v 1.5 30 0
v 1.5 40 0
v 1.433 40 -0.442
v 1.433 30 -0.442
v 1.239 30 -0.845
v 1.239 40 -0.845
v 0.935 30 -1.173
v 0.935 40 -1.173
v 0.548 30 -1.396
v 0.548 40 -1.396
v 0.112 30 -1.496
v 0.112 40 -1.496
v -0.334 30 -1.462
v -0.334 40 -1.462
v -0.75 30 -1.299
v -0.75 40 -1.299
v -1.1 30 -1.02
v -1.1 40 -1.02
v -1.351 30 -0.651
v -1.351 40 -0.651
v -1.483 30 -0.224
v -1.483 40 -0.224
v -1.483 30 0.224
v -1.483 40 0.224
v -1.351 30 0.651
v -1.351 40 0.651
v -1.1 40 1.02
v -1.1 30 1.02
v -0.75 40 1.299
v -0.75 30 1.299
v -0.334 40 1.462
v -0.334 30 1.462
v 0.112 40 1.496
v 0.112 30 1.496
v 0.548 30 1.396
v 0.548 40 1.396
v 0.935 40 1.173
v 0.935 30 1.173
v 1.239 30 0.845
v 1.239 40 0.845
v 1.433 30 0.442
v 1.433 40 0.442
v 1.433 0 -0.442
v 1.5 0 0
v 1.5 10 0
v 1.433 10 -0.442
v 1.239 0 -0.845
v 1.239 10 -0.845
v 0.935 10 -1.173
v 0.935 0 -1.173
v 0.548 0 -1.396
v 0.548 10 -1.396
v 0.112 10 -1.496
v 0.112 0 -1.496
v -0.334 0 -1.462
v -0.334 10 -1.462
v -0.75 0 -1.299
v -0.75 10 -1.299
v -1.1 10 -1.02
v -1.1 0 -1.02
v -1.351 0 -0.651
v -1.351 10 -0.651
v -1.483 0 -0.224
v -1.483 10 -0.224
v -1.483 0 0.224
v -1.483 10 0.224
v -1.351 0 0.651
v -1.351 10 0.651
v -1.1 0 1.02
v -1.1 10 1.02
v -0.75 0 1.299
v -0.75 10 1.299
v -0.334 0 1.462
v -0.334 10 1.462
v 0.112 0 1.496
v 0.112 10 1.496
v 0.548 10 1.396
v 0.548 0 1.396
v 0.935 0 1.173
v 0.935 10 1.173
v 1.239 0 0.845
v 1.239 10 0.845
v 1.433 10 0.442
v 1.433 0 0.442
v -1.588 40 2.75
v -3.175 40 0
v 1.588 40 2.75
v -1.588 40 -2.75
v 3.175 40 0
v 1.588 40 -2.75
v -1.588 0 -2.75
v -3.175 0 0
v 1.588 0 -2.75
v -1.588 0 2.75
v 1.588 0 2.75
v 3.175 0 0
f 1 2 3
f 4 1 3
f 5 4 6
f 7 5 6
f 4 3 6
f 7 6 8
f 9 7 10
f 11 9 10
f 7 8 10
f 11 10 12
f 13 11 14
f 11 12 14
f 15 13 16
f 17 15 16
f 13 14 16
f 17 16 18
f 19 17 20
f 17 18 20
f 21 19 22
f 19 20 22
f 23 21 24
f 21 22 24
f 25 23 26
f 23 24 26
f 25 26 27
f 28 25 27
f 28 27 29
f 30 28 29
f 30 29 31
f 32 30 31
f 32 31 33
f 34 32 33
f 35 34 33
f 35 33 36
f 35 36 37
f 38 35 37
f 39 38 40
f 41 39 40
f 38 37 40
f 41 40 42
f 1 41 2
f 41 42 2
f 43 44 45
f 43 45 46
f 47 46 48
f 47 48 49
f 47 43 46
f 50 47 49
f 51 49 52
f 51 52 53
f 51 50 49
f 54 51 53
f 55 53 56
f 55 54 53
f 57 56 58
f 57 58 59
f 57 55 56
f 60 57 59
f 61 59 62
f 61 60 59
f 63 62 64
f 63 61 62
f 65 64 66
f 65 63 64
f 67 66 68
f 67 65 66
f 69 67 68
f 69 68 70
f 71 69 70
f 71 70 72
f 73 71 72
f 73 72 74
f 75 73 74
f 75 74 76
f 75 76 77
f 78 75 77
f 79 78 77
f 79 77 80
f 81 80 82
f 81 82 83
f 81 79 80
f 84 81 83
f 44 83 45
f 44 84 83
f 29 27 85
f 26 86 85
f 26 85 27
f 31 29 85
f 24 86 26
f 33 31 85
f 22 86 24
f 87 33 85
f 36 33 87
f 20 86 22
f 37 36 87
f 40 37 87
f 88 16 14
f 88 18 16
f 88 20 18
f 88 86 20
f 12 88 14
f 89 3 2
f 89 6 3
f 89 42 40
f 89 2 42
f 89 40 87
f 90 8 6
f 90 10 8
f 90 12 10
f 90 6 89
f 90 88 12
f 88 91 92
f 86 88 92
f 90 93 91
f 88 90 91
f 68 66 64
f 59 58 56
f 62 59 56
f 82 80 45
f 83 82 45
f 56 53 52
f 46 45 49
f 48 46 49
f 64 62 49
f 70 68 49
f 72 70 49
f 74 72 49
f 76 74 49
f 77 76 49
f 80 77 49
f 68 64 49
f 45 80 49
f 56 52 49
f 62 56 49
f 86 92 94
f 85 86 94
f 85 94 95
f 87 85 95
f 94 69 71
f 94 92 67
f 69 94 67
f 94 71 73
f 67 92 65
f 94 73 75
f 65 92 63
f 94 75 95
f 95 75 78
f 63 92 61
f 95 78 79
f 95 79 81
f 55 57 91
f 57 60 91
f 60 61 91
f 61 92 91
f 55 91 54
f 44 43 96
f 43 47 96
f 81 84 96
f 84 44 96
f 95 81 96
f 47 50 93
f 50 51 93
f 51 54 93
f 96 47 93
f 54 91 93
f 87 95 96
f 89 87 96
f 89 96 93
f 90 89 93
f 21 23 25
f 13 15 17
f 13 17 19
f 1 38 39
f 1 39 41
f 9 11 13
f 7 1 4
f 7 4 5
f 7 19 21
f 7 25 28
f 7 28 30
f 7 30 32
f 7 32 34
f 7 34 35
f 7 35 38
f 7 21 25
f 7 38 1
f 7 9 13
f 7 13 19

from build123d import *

# Parameters (mm, degrees)
BOSS_EXTRUDE1_DEPTH = 40
SKETCH2_R           = 1.5
CUT_EXTRUDE1_DEPTH  = 10


with BuildPart() as part:
    # Sketch1 → Boss-Extrude1 (new body)
    with BuildSketch(Plane(origin=(0, 0, 0), x_dir=(1, 0, 0), z_dir=(0, 1, 0))):
        Polygon((3.175426481, 0), (1.58771324, 2.75), (-1.58771324, 2.75), (-3.175426481, 0), (-1.58771324, -2.75), (1.58771324, -2.75), align=None)
    extrude(amount=BOSS_EXTRUDE1_DEPTH)

    # Sketch2 → Cut-Extrude1 (cut)
    with BuildSketch(Plane(origin=(0, 40, 0), x_dir=(1, 0, 0), z_dir=(0, 1, 0))):
        Circle(SKETCH2_R)
    cut_extrude1 = extrude(amount=-CUT_EXTRUDE1_DEPTH, mode=Mode.SUBTRACT)

    # Mirror1: Cut-Extrude1 across plane
    add(cut_extrude1.mirror(Plane(origin=(0, 20, 0), x_dir=(0, 0, 1), z_dir=(0, -1, 0))), mode=Mode.SUBTRACT)


solid = part.part
